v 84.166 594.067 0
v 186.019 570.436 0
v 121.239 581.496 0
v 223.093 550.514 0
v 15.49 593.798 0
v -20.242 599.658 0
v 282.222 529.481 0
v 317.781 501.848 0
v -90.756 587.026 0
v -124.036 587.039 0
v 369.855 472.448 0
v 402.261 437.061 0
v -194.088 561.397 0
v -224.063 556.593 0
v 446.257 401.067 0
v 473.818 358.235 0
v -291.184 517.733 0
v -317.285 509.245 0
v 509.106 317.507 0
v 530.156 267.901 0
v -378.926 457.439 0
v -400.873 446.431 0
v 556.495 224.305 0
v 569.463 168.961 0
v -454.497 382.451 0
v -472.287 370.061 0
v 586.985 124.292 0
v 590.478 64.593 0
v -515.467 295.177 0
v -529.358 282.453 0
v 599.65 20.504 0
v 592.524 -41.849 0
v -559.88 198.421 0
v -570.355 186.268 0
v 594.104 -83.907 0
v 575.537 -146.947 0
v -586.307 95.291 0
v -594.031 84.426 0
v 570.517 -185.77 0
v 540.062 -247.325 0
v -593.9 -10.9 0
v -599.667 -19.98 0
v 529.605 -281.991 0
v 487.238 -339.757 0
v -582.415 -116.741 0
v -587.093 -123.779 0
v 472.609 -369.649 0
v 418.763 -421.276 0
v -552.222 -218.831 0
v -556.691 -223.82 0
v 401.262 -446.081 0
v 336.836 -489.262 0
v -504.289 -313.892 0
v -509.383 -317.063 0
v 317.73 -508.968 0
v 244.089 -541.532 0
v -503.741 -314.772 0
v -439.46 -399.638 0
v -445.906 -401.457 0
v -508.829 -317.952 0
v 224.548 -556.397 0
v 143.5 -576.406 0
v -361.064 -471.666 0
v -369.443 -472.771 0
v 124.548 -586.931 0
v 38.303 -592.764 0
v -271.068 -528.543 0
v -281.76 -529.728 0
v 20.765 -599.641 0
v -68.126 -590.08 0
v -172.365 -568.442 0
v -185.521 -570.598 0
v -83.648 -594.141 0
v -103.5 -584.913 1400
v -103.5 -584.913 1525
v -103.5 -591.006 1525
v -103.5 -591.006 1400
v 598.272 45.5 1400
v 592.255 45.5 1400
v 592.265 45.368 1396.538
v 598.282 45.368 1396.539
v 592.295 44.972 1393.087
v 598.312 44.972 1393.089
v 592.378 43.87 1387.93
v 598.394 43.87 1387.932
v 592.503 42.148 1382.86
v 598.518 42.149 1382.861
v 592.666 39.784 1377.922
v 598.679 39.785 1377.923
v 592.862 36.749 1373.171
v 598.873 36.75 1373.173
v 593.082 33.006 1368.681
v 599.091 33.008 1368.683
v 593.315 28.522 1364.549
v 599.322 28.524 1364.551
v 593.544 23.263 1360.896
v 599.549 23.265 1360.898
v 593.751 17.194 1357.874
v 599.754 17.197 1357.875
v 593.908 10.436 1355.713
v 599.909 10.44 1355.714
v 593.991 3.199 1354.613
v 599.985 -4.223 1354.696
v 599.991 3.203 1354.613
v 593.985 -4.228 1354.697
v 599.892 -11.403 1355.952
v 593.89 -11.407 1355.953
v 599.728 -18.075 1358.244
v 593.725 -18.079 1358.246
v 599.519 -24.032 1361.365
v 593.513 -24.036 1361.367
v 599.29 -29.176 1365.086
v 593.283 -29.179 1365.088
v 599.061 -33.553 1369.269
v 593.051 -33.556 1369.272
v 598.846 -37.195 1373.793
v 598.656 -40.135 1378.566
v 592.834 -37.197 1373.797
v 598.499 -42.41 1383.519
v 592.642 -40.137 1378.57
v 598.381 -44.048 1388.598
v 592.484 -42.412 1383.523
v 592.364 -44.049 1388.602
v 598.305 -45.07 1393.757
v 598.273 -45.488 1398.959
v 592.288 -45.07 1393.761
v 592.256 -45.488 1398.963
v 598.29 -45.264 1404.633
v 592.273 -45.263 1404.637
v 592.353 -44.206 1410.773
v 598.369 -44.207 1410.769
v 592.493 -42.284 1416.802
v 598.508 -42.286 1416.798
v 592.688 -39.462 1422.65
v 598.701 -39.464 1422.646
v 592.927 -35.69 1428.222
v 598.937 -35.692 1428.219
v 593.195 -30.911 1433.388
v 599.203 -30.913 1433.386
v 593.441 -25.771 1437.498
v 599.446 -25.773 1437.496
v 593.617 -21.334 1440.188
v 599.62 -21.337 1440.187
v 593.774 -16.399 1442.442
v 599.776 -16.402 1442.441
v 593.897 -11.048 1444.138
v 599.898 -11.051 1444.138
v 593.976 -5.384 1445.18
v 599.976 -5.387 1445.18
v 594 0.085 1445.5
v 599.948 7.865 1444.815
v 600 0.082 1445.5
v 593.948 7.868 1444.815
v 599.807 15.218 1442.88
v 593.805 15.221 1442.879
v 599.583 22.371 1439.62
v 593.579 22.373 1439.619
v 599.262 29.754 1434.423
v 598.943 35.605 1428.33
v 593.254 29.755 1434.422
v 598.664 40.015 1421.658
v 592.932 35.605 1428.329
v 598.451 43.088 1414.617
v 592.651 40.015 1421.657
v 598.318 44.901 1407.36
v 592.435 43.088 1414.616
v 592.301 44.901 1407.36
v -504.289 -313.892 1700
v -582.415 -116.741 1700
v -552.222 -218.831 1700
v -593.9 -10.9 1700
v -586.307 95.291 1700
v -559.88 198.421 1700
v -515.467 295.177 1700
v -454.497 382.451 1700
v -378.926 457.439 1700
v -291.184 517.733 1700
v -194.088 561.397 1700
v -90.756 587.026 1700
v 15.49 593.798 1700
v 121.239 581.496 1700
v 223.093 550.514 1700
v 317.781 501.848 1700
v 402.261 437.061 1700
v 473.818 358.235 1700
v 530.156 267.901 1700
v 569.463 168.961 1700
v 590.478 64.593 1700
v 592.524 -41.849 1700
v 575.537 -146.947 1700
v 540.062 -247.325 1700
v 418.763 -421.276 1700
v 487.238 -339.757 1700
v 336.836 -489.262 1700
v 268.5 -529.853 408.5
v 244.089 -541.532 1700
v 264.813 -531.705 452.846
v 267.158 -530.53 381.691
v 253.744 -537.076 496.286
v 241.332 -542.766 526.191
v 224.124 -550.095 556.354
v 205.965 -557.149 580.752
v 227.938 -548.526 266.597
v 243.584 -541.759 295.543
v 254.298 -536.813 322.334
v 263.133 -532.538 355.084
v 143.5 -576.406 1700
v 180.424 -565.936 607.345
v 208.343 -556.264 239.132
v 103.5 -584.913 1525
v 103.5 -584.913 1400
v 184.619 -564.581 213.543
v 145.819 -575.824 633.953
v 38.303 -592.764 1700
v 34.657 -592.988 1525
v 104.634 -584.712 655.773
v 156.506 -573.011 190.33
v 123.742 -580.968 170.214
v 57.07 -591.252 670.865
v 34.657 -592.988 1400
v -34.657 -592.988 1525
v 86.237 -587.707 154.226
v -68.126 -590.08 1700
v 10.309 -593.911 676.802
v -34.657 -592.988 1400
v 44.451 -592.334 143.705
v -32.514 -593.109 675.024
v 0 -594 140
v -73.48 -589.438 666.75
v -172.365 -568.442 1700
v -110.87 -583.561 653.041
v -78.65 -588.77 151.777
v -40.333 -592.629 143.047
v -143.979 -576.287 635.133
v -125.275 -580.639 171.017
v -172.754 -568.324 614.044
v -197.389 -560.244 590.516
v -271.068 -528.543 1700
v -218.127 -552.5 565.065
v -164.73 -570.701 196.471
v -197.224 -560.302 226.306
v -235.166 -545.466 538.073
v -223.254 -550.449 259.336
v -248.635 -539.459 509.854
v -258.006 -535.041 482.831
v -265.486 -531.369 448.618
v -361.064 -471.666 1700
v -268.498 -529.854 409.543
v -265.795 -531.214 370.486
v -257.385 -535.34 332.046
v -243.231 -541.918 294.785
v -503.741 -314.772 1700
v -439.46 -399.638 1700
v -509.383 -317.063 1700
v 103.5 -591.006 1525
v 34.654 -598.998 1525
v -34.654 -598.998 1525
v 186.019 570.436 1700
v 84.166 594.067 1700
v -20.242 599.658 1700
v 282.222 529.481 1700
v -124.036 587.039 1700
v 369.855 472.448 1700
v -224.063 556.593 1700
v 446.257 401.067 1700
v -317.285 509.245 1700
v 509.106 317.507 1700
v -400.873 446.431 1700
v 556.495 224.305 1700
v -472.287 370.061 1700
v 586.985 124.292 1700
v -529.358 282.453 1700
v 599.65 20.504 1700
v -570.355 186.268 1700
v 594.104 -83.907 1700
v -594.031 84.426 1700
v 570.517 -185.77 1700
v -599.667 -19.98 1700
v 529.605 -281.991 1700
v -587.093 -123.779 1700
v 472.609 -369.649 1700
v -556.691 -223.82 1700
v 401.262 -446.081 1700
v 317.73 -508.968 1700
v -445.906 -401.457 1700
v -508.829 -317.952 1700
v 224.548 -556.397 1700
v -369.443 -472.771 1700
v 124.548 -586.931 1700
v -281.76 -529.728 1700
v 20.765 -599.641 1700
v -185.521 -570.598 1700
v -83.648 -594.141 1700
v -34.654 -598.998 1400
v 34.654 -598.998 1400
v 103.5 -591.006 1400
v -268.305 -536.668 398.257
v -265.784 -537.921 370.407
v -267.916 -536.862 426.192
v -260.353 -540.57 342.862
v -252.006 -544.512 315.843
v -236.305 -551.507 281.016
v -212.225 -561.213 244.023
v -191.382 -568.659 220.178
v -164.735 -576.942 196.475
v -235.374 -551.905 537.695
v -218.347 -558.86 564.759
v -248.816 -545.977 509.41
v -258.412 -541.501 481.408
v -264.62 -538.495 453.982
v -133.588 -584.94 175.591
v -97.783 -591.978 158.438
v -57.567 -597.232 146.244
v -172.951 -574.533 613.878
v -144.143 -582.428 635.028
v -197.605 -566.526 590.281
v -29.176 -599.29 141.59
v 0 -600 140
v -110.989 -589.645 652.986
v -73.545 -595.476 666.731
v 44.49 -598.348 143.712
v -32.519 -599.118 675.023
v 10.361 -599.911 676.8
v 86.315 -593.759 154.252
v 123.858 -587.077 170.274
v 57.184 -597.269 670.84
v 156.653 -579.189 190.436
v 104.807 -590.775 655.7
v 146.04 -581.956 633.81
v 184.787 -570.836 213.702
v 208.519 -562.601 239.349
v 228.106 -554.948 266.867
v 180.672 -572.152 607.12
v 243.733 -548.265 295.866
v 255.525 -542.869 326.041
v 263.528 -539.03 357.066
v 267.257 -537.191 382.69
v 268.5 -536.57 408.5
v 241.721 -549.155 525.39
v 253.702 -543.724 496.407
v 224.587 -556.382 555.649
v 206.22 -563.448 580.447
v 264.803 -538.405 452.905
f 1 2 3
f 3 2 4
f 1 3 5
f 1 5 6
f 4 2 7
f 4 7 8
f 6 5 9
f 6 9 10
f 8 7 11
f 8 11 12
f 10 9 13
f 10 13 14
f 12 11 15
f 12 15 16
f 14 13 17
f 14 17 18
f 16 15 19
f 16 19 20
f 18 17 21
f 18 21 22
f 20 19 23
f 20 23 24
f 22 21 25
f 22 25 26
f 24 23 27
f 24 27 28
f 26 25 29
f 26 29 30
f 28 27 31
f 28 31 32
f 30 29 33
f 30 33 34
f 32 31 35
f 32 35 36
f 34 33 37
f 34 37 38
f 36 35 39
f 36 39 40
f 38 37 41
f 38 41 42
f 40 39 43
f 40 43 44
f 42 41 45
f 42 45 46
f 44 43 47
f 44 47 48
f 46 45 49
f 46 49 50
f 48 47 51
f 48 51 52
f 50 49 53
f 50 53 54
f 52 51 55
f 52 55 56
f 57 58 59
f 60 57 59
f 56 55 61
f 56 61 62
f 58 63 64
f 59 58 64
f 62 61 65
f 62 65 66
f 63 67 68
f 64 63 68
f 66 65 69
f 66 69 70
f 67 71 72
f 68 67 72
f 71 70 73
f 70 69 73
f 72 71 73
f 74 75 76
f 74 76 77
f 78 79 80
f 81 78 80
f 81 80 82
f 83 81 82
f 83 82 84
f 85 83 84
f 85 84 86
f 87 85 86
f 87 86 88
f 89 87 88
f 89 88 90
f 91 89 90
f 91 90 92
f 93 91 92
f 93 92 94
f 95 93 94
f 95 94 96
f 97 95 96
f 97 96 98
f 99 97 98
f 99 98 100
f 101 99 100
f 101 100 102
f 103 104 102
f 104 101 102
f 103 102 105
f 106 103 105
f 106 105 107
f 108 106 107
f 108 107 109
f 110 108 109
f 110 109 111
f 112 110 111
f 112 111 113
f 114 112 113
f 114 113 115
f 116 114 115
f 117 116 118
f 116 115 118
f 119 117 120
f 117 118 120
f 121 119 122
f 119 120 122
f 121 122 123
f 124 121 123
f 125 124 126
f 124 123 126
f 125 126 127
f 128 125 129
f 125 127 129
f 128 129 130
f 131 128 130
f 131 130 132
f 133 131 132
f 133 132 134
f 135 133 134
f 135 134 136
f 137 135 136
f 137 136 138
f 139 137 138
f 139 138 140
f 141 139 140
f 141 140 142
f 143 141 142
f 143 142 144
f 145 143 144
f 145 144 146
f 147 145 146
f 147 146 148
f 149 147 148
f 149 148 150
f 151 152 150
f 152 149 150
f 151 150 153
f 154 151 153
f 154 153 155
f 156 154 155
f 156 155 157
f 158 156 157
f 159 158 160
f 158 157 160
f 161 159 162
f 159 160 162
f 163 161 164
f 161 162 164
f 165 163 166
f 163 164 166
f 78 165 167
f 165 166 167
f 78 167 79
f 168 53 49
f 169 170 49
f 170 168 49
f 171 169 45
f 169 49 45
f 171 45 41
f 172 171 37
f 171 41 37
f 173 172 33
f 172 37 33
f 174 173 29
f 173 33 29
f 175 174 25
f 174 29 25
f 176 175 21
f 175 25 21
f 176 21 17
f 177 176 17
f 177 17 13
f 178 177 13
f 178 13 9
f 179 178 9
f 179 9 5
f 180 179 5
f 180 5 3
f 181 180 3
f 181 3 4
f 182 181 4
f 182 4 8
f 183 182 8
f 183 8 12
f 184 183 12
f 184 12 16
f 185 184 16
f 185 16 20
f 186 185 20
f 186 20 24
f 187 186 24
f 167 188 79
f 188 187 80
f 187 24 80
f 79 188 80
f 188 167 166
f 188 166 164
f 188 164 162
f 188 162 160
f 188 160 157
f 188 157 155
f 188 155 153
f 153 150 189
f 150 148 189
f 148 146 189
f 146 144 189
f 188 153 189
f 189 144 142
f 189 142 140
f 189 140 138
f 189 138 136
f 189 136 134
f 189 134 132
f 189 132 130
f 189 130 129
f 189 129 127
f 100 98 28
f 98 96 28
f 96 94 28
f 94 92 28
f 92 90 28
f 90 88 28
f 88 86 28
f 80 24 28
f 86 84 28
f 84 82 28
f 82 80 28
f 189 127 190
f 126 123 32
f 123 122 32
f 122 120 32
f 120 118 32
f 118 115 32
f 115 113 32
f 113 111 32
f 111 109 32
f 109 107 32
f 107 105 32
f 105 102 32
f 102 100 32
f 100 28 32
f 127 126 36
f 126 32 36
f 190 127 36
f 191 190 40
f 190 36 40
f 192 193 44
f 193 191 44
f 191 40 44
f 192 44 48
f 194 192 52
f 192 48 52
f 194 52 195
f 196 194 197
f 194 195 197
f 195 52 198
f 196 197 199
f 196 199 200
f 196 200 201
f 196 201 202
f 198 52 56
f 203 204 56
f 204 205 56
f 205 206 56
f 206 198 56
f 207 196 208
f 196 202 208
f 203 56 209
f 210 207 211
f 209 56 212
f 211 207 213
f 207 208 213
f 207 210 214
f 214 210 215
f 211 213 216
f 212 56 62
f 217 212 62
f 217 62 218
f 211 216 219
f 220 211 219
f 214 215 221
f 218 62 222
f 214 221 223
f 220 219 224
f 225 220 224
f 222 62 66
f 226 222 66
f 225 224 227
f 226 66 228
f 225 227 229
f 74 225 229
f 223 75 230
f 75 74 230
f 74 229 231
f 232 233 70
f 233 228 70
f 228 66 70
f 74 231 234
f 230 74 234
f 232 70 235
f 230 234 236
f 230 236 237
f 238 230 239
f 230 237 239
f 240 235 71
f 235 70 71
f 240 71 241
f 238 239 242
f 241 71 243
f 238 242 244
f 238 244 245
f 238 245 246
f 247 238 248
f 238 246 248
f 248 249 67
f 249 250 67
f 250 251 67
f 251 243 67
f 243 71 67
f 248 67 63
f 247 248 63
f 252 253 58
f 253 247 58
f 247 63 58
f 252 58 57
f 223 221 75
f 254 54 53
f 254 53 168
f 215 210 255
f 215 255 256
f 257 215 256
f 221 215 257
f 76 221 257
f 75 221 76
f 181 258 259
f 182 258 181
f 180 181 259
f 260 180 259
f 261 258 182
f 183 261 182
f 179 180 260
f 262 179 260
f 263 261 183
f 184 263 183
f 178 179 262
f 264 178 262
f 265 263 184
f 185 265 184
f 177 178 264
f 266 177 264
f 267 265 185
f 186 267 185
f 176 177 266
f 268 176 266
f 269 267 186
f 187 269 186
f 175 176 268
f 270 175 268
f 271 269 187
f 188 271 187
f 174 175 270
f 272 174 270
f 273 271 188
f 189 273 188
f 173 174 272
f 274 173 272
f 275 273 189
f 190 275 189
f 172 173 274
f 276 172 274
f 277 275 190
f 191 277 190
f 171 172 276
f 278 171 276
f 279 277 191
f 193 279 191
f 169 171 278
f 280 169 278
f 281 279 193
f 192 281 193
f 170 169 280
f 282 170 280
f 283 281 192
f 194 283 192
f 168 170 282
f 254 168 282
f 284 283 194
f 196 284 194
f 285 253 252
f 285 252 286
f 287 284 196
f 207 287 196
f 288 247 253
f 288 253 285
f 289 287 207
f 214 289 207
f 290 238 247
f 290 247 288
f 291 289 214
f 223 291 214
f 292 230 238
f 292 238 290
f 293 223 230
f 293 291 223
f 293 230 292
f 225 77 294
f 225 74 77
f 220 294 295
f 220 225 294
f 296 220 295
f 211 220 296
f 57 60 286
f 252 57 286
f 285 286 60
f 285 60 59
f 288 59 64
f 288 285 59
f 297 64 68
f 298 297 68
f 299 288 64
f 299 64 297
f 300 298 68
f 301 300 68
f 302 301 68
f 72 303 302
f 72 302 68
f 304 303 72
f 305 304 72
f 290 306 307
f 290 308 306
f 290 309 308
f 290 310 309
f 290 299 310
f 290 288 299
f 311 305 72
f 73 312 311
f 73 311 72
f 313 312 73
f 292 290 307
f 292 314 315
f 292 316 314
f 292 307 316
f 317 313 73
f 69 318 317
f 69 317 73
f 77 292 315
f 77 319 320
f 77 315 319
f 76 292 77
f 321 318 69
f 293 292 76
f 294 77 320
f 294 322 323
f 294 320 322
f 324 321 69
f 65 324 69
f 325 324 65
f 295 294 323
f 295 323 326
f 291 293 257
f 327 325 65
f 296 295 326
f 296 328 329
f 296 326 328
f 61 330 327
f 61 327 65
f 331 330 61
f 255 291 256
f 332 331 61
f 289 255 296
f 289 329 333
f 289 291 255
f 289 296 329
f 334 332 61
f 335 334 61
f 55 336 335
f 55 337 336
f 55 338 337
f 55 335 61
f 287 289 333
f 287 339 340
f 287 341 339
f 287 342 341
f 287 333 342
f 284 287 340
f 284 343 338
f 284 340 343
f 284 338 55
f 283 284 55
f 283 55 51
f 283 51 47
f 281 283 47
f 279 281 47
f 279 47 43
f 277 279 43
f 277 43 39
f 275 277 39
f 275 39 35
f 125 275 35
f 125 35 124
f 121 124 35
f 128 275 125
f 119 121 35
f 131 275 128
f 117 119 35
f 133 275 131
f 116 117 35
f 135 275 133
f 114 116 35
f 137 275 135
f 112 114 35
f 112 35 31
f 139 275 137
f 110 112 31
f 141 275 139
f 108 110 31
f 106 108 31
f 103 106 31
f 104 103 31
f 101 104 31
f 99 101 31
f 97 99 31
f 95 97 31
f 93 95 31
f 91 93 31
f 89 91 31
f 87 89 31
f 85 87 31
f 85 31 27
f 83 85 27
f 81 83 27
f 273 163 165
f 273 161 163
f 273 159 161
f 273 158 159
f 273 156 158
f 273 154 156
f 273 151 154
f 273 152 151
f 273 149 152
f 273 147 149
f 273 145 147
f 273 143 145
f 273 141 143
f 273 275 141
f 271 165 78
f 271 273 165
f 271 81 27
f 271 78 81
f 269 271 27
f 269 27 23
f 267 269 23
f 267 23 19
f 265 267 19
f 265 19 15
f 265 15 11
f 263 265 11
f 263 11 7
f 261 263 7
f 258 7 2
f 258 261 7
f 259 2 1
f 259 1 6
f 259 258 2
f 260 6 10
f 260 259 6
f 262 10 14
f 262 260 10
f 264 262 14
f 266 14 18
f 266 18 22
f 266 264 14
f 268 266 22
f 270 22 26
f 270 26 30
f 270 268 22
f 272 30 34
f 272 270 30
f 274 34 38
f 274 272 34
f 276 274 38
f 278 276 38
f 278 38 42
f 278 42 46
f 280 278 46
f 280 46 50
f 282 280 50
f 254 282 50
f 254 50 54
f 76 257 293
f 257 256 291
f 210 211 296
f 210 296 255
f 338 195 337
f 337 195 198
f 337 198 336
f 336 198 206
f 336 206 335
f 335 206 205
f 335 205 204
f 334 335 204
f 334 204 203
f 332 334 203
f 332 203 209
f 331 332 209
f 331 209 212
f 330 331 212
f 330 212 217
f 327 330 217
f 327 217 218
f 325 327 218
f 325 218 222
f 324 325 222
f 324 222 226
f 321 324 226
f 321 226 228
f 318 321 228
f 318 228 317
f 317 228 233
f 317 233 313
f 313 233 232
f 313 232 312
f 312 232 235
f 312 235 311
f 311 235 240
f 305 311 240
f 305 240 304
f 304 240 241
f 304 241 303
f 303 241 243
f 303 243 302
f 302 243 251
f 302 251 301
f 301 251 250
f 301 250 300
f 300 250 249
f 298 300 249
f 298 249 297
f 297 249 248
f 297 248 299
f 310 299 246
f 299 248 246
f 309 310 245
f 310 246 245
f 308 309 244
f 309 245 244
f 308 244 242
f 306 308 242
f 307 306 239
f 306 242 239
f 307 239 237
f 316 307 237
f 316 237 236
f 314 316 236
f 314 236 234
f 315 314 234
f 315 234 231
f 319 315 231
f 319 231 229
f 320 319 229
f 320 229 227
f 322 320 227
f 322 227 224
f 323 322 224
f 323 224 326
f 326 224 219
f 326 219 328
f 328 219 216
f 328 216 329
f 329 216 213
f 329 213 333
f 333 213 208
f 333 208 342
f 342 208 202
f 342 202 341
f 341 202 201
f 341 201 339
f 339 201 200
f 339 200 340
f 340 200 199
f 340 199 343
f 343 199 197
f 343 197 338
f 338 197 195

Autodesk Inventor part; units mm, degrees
sketch "Sketch13" plane through (0, 0, 0) normal (0, 0, 1) x (1, 0, 0)
  circle A0 centre (0, 0) radius 600 construction
  line L0 (0, 0) -> (0, -600)
  line L1 (0, 0) -> (-508.8289, -317.9516)
  line L2 (0, 0) -> (600, 0)
  line L3 (0, 0) -> (0, -600)
  line L4 (0, 0) -> (0, -600)
  line L5 (0, 0) -> (-534.6039, -272.3943)
  arc A1 (-508.8289, -317.9516) -> (0, -600) centre (0, 0) ccw
  dimension "d53" = 1200
  dimension "d54" = 58
  dimension "d55" = 0
  dimension "d56" = 0
  dimension "d57" = 270
  dimension "d58" = 63
ref_plane "WeldJoint" through (0, 0, -10) normal (0.5299, -0.848, 0) x (0, 0, 1)
ref_plane "Outer" through (0, 0, -10) normal (0.454, -0.891, 0) x (0, 0, 1)
ref_plane "Clock_Feeder" through (0, 0, -10) normal (0, 1, 0) x (0, 0, 1)
ref_plane "Charging" through (0, 0, -10) normal (1, 0, 0) x (0, 0, 1)
ref_plane "Accsess" through (0, 0, -10) normal (1, 0, 0) x (0, 0, 1)
sketch "Sketch14" plane through (0, 0, -10) normal (0.5299, -0.848, 0) x (0, 0, 1)
  line L0 (1710, 594) -> (10, 594)
  line L1 (10, 594) -> (10, 600)
  line L2 (10, 600) -> (1710, 600)
  line L3 (1710, 600) -> (1710, 594)
  line L4 (10, 0) -> (825.0673, 0)
  point P0 (10, 597)
  dimension "d59" = 1700
  dimension "d60" = 6
  dimension "d61" = 1200
revolve "Revolution2" add sketch "Sketch14" angle 359.9 about axis through (0, 0, 0) along (0, 0, 1)
sketch "Sketch AnglePlane_Feeder" plane through (0, 0, -10) normal (0, 1, 0) x (0, 0, 1)
  line L0 (10, -600) -> (10, 600) projected
  line L1 (10, 0) -> (1410, 0)
  line L2 (1410, 0) -> (1410, 600)
  line L3 (1410, 600) -> (10, 600)
  line L4 (10, 600) -> (10, 0)
  point P0 (10, -508.8289)
  point P1 (10, -509.383)
  dimension "d63" = 1200
  dimension "d64" = 90
  dimension "frd_hght" = 1400
ref_plane "AnglePlane_Feeder" through (0, 0, 1400) normal (1, 0, 0) x (0, 1, 0)
sketch "Sketch16" plane through (0, 0, 1400) normal (1, 0, 0) x (0, 1, 0)
  circle A0 centre (0, 0) radius 45.5
  point P0 (0, -1400)
  point P1 (0, 0)
  point P2 (0, 0)
  point P3 (0, 0)
  dimension "d66" = 91
extrude "Extrusion7" cut sketch "Sketch16" along normal through all
ref_plane "Work Plane16" through (0, 0, 0) normal (0, -1, 0) x (1, 0, 0)
sketch "Sketch17" plane through (0, 0, 0) normal (0, -1, 0) x (1, 0, 0)
  circle A0 centre (0, 408.5) radius 268.5
  line L0 (0, 140) -> (-495.5727, 140)
  point P0 (0, 0)
  dimension "d69" = 537
  dimension "d71" = 140
extrude "Extrusion8" cut sketch "Sketch17" along normal through all
sketch "Sketch19" plane through (0, 0, -10) normal (1, 0, 0) x (0, 0, 1)
  line L0 (10, 0) -> (1410, 0)
  line L1 (1410, 0) -> (1410, 600)
  line L2 (1410, 600) -> (10, 600)
  line L3 (10, 600) -> (10, 0)
  dimension "d74" = 1400
  dimension "d76" = 1200
  dimension "d77" = 90
ref_plane "Work Plane18" through (0, 0, 1400) normal (0, -1, 0) x (1, 0, 0)
sketch "Sketch20" plane through (0, 0, 1400) normal (0, -1, 0) x (1, 0, 0)
  line L0 (-103.5, 0) -> (103.5, 0)
  line L1 (103.5, 0) -> (103.5, 125)
  line L2 (103.5, 125) -> (-103.5, 125)
  line L3 (-103.5, 125) -> (-103.5, 0)
  point P0 (0, -1400)
  point P1 (0, 0)
  point P2 (0, 0)
  point P3 (0, 0)
  point P4 (0, 0)
  dimension "d78" = 207
  dimension "d79" = 125
extrude "Extrusion9" cut sketch "Sketch20" along normal through all
equation "\"BendRadius\" = Thickness"
equation "\"BendReliefWidth\" = Thickness"
equation "\"BendReliefDepth\" = 0.5 * Thickness"
equation "\"CornerReliefSize\" = 4 * Thickness"
equation "\"MinimumRemnant\" = 2 * Thickness"
equation "\"TransitionRadius\" = BendRadius"
equation "\"JacobiRadiusSize\" = BendRadius"
equation "\"GapSize\" = Thickness"
equation "\"Feeder_horisont_angle\" = 0"
equation "\"Hatch_Accsess_diameter\" = 535"
equation "\"Clock_Accsess_angle\" = 0"
equation "\"Clock_Charging_agnle\" = 0"
equation "\"Clock_Feeder_angle\" = 270deg"
equation "\"Clock_Outer_angle\" = 63deg"
equation "\"Clock_WeldJoint_angle\" = 58deg"
equation "\"Thickness\" = 6"
properties part number "PRS 1200-10 main Shell" material "Steel"
